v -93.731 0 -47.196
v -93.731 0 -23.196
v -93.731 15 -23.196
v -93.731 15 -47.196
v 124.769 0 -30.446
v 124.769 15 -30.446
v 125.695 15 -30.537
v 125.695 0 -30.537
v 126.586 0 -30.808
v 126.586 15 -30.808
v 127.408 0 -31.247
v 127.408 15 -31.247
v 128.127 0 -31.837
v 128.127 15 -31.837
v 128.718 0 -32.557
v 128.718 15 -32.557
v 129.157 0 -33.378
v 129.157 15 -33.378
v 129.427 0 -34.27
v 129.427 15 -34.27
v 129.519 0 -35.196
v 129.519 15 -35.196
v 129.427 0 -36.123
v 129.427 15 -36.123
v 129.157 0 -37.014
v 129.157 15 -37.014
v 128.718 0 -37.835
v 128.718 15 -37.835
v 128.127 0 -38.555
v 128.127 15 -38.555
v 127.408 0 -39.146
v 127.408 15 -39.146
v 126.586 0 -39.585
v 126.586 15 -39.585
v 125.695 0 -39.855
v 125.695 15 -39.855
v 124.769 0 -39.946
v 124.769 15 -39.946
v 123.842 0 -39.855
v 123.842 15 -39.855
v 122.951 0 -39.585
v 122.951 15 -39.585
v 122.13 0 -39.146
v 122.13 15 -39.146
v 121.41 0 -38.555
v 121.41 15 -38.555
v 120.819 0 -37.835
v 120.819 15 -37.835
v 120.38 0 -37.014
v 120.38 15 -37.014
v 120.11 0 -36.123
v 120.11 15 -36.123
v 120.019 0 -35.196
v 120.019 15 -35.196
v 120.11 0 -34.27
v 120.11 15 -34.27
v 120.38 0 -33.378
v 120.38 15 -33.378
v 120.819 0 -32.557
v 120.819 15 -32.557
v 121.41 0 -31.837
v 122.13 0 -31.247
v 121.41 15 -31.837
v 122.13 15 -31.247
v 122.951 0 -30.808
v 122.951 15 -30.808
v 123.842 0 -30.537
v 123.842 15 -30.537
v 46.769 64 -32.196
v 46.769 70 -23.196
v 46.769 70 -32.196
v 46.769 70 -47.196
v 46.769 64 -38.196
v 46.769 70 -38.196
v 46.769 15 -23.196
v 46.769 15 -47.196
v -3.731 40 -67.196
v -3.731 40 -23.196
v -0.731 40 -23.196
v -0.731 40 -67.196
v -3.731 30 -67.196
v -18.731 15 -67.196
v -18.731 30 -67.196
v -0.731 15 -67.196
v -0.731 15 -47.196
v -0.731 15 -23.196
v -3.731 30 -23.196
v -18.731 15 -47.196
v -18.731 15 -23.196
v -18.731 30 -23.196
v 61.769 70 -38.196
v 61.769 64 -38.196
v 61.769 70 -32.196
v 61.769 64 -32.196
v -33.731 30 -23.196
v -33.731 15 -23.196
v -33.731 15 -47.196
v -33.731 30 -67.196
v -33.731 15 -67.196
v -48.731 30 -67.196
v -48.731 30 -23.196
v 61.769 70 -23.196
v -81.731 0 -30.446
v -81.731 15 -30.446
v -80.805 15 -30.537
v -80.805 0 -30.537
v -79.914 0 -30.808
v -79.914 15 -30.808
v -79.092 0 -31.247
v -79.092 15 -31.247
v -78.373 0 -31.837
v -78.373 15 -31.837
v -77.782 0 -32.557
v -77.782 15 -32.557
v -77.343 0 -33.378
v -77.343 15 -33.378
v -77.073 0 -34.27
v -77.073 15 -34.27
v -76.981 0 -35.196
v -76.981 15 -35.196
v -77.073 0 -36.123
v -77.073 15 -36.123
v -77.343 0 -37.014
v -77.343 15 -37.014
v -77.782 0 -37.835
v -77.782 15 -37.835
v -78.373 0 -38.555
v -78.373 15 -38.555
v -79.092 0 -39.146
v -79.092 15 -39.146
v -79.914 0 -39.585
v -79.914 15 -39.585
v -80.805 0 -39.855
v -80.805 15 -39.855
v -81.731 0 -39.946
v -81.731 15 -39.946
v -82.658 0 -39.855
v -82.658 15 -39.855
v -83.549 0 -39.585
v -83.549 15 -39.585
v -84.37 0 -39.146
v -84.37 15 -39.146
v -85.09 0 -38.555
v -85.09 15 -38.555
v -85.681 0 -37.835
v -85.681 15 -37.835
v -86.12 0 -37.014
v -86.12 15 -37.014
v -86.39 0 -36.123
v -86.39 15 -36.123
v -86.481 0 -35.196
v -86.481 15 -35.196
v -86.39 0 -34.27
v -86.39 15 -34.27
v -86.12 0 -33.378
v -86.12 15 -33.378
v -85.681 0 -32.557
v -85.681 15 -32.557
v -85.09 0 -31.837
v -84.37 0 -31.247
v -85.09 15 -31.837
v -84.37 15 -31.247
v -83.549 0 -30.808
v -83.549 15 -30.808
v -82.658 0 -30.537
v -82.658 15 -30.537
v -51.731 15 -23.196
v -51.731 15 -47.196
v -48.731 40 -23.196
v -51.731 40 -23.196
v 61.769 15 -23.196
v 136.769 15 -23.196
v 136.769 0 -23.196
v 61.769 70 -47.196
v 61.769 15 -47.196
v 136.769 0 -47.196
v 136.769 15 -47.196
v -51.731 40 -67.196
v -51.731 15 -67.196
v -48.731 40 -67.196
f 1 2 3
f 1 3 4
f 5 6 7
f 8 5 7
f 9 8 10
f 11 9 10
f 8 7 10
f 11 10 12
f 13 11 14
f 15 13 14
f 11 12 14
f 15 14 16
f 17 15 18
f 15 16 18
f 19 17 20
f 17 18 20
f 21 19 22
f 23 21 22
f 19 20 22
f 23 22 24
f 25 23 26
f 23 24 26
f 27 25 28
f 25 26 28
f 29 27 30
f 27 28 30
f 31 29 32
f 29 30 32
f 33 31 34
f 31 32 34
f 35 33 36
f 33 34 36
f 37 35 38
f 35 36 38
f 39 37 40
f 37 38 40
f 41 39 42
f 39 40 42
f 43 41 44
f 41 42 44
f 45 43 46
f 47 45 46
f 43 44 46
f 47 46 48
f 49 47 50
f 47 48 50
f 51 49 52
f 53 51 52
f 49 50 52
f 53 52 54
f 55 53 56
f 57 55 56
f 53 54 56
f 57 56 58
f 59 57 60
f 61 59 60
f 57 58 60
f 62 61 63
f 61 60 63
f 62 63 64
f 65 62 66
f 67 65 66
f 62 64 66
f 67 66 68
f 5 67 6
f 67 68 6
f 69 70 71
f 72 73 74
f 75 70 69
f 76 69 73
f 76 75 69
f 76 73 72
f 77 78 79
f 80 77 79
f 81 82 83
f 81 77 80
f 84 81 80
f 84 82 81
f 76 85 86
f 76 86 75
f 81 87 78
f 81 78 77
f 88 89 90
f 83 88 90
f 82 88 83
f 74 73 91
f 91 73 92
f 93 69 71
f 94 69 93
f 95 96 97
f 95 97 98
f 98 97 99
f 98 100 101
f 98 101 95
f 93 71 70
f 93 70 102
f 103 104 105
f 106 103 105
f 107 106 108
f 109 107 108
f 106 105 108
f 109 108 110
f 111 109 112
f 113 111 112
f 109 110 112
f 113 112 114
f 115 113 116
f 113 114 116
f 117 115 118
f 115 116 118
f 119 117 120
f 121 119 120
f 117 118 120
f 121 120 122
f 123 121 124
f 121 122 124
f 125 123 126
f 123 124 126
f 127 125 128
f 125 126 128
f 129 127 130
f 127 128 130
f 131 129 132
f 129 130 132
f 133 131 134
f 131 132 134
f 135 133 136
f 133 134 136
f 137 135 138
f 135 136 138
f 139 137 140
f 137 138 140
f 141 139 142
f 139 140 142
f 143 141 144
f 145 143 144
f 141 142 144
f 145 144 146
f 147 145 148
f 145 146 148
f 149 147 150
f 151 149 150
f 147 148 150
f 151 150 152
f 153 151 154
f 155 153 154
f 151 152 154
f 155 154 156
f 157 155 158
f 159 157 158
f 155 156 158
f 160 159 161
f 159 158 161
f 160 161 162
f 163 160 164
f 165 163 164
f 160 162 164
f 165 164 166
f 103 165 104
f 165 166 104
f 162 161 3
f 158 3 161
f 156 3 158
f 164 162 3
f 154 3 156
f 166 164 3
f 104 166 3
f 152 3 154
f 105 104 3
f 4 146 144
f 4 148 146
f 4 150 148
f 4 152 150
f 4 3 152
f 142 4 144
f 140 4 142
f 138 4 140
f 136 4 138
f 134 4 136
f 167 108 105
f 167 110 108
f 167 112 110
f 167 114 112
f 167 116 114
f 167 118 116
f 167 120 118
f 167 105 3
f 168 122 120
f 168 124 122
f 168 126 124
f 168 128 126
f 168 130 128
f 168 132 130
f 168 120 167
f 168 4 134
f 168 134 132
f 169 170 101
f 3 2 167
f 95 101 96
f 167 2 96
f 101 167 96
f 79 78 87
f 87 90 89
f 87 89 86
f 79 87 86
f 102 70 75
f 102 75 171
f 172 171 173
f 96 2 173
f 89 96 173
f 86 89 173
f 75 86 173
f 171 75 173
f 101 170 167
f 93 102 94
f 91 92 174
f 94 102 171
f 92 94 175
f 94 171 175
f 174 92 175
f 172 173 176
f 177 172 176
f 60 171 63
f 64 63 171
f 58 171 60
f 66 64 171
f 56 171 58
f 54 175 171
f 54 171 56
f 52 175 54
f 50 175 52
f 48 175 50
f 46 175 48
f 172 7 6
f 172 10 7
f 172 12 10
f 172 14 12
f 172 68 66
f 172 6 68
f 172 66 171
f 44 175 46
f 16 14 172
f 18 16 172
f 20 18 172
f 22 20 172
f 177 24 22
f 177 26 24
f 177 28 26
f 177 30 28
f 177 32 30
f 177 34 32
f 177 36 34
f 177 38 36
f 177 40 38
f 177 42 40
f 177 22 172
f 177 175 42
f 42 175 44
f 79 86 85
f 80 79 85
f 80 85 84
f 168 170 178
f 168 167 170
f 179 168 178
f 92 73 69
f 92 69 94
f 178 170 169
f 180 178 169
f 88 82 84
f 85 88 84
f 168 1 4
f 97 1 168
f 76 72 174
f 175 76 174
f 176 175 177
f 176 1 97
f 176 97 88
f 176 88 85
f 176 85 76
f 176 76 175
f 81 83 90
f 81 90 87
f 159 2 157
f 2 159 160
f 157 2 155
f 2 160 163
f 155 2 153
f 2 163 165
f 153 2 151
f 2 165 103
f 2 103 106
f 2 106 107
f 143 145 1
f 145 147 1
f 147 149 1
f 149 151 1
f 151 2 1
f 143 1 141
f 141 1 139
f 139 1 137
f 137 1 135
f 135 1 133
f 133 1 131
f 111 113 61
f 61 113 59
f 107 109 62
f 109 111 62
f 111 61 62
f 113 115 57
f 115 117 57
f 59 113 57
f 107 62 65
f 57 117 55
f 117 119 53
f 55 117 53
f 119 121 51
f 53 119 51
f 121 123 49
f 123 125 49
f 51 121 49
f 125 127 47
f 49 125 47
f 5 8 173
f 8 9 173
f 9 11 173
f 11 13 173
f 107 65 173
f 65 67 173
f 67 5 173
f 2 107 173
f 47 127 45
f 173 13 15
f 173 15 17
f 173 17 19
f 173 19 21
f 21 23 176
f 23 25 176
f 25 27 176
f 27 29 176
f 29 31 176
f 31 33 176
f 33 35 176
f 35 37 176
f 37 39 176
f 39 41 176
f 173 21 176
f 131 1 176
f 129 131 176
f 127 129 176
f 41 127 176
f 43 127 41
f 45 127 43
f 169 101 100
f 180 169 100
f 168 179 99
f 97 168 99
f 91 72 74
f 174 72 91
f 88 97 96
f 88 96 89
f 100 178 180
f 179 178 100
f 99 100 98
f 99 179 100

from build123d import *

# Parameters (mm, degrees)
SKETCH1_W           = 230.5
SKETCH1_H           = 24
BOSS_EXTRUDE1_DEPTH = 15
SKETCH2_R           = 4.75
CUT_EXTRUDE1_DEPTH  = 15
SKETCH4_W           = 18
SKETCH4_H           = 44
BOSS_EXTRUDE2_DEPTH = 15
SKETCH5_W           = 15
SKETCH5_H           = 24
BOSS_EXTRUDE3_DEPTH = 49
SKETCH6_W           = 15
SKETCH6_H           = 9
BOSS_EXTRUDE4_DEPTH = 6
SKETCH7_W           = 3
SKETCH7_H           = 44
BOSS_EXTRUDE5_DEPTH = 10


with BuildPart() as part:
    # Sketch1 → Boss-Extrude1 (new body)
    with BuildSketch(Plane(origin=(0, 0, 0), x_dir=(1, 0, 0), z_dir=(0, 1, 0))):
        with Locations((21.518565941, 35.196222791)):
            Rectangle(SKETCH1_W, SKETCH1_H)
    extrude(amount=BOSS_EXTRUDE1_DEPTH)

    # Sketch2 → Cut-Extrude1 (cut)
    with BuildSketch(Plane(origin=(0, 15, 0), x_dir=(1, 0, 0), z_dir=(0, 1, 0))):
        with Locations(Location((-81.731434059, 35.196222791, 0), (0, 0, 270))):
            Circle(SKETCH2_R)
        with Locations(Location((124.768565941, 35.196222791, 0), (0, 0, 270))):
            Circle(SKETCH2_R)
    extrude(amount=-CUT_EXTRUDE1_DEPTH, mode=Mode.SUBTRACT)

    # Sketch4 → Boss-Extrude2 (add)
    with BuildSketch(Plane(origin=(0, 15, 0), x_dir=(1, 0, 0), z_dir=(0, 1, 0))):
        with Locations((-42.731434059, 45.196222791)):
            Rectangle(SKETCH4_W, SKETCH4_H)
        with Locations((-9.731434059, 45.196222791)):
            Rectangle(SKETCH4_W, SKETCH4_H)
    extrude(amount=BOSS_EXTRUDE2_DEPTH)

    # Sketch5 → Boss-Extrude3 (add)
    with BuildSketch(Plane(origin=(0, 15, 0), x_dir=(1, 0, 0), z_dir=(0, 1, 0))):
        with Locations((54.268565941, 35.196222791)):
            Rectangle(SKETCH5_W, SKETCH5_H)
    extrude(amount=BOSS_EXTRUDE3_DEPTH)

    # Sketch6 → Boss-Extrude4 (add)
    with BuildSketch(Plane(origin=(0, 64, 0), x_dir=(1, 0, 0), z_dir=(0, 1, 0))):
        with Locations((54.268565941, 42.696222791)):
            Rectangle(SKETCH6_W, SKETCH6_H)
        with Locations((54.268565941, 27.696222791)):
            Rectangle(SKETCH6_W, SKETCH6_H)
    extrude(amount=BOSS_EXTRUDE4_DEPTH)

    # Sketch7 → Boss-Extrude5 (add)
    with BuildSketch(Plane(origin=(0, 30, 0), x_dir=(1, 0, 0), z_dir=(0, 1, 0))):
        with Locations((-50.231434059, 45.196222791)):
            Rectangle(SKETCH7_W, SKETCH7_H)
        with Locations((-2.231434059, 45.196222791)):
            Rectangle(SKETCH7_W, SKETCH7_H)
    extrude(amount=BOSS_EXTRUDE5_DEPTH)


solid = part.part
